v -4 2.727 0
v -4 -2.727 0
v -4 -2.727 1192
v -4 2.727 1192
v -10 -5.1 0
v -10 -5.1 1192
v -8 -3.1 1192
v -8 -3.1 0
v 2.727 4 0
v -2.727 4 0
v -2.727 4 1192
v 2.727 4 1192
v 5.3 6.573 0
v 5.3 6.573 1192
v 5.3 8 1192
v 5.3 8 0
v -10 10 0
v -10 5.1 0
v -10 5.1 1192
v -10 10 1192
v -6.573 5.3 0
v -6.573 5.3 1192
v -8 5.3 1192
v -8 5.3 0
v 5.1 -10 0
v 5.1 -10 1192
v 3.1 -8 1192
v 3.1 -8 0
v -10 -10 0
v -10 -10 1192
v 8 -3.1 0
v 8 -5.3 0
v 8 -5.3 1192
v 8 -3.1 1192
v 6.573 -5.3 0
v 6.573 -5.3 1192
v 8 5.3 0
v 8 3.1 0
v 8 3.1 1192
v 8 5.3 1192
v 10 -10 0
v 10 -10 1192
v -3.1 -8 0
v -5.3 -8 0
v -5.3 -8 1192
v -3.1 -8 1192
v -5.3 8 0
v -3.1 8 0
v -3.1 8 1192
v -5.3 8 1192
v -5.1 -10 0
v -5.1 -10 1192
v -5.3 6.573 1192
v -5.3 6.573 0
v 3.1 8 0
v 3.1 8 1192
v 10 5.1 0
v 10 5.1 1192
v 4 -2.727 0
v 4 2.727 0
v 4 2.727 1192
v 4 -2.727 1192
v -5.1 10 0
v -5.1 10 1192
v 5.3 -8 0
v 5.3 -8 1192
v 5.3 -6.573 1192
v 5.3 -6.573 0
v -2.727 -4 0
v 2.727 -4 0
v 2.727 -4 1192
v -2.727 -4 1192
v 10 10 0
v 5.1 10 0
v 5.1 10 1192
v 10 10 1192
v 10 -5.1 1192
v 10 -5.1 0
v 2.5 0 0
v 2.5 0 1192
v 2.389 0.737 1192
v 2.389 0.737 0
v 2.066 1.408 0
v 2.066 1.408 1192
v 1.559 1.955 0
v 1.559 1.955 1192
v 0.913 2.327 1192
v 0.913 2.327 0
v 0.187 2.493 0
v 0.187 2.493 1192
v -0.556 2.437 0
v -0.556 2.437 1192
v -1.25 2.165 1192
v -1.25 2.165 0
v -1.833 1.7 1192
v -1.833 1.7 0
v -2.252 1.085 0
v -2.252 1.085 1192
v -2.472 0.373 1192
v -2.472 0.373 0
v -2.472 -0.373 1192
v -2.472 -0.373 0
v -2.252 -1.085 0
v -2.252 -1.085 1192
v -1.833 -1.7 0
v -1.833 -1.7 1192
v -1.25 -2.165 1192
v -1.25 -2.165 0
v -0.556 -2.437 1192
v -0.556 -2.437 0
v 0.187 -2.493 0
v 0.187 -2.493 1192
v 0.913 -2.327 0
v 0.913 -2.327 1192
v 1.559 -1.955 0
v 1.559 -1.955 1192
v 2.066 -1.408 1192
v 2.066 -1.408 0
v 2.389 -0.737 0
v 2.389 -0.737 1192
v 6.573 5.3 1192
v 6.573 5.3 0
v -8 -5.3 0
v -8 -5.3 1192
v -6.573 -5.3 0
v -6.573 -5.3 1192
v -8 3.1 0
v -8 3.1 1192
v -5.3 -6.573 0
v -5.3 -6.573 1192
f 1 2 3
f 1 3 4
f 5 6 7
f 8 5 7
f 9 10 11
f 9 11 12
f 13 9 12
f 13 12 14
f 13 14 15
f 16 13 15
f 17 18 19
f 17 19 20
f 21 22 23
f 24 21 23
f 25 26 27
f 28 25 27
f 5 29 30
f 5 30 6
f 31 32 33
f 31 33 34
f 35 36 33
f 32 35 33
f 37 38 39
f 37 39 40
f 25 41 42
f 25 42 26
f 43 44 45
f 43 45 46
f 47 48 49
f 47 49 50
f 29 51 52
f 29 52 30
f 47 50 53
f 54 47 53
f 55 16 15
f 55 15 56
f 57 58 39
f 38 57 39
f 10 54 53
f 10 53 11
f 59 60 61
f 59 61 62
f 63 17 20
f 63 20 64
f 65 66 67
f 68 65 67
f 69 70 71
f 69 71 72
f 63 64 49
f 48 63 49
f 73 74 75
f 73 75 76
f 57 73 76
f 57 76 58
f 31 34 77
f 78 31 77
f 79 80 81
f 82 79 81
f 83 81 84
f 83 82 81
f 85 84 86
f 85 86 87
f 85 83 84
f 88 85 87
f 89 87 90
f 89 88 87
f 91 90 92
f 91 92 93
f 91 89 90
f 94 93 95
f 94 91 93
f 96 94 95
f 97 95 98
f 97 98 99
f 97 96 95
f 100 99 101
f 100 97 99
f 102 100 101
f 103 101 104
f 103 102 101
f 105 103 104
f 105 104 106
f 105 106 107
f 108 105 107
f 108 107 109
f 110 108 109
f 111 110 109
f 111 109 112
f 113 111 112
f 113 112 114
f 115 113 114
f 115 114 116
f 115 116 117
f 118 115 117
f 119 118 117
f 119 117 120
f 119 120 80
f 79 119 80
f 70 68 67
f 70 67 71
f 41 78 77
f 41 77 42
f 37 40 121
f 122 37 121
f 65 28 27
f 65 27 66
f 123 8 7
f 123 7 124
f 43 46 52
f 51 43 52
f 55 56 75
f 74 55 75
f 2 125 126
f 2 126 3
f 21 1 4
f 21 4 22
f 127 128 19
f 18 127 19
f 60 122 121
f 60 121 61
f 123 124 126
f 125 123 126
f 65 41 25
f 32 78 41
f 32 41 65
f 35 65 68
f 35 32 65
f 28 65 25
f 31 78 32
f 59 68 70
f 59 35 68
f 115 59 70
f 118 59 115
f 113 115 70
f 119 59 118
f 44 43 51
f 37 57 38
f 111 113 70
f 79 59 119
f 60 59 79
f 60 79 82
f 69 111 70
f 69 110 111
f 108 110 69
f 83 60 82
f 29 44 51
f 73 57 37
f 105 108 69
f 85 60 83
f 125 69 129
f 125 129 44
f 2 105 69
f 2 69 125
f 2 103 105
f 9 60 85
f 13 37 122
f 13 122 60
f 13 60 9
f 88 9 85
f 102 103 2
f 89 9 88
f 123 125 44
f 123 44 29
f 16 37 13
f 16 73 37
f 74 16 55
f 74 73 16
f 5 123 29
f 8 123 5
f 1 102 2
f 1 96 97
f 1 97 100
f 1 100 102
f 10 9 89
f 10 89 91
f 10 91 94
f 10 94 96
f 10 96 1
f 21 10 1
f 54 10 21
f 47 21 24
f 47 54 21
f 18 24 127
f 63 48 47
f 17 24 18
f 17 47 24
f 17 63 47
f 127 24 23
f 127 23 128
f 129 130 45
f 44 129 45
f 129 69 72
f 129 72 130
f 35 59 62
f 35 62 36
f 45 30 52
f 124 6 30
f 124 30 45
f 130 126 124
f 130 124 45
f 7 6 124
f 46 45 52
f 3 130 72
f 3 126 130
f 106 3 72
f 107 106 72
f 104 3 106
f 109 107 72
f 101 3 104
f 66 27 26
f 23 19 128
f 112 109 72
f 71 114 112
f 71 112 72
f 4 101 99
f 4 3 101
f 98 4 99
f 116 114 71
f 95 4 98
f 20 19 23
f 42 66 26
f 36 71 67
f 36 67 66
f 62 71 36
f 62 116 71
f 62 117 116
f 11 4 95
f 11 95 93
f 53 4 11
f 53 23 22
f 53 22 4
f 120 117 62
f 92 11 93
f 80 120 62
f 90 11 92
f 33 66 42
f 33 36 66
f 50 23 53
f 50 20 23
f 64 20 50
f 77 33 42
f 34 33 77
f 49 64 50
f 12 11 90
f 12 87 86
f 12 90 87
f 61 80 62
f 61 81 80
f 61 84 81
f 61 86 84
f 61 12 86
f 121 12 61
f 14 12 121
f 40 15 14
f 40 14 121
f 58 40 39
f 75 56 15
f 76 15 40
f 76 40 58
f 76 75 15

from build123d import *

# Parameters (mm, degrees)
SKETCH1_R              = 2.5
BOSS_EXTRUDE1_DEPTH    = 1200
CUT_REVOLVE1_START     = 1192
CUT_REVOLVE1_OUTLINE_R = 2.5
CUT_REVOLVE1_DEPTH     = 8


# Read off the part's stored shape, not the designer's step: Cut-Revolve1
with BuildPart() as part:
    # Sketch1 → Boss-Extrude1 (new body)
    with BuildSketch(Plane.XY):
        Polygon((-2.727207794, 4), (2.727207794, 4), (5.3, 6.572792206), (5.3, 8), (3.1, 8), (5.1, 10), (10, 10), (10, 5.1), (8, 3.1), (8, 5.3), (6.572792206, 5.3), (4, 2.727207794), (4, -2.727207794), (6.572792206, -5.3), (8, -5.3), (8, -3.1), (10, -5.1), (10, -10), (5.1, -10), (3.1, -8), (5.3, -8), (5.3, -6.572792206), (2.727207794, -4), (-2.727207794, -4), (-5.3, -6.572792206), (-5.3, -8), (-3.1, -8), (-5.1, -10), (-10, -10), (-10, -5.1), (-8, -3.1), (-8, -5.3), (-6.572792206, -5.3), (-4, -2.727207794), (-4, 2.727207794), (-6.572792206, 5.3), (-8, 5.3), (-8, 3.1), (-10, 5.1), (-10, 10), (-5.1, 10), (-3.1, 8), (-5.3, 8), (-5.3, 6.572792206), align=None)
        Circle(SKETCH1_R, mode=Mode.SUBTRACT)
    extrude(amount=BOSS_EXTRUDE1_DEPTH)

    # Cut-Revolve1 outline → Cut-Revolve1 (cut)
    with BuildSketch(Plane.XY.offset(CUT_REVOLVE1_START)):
        Polygon((4, 2.727207794), (6.572792206, 5.3), (8, 5.3), (8, 3.1), (10, 5.1), (10, 10), (5.1, 10), (3.1, 8), (5.3, 8), (5.3, 6.572792206), (2.727207794, 4), (-2.727207794, 4), (-5.3, 6.572792206), (-5.3, 8), (-3.1, 8), (-5.1, 10), (-10, 10), (-10, 5.1), (-8, 3.1), (-8, 5.3), (-6.572792206, 5.3), (-4, 2.727207794), (-4, -2.727207794), (-6.572792206, -5.3), (-8, -5.3), (-8, -3.1), (-10, -5.1), (-10, -10), (-5.1, -10), (-3.1, -8), (-5.3, -8), (-5.3, -6.572792206), (-2.727207794, -4), (2.727207794, -4), (5.3, -6.572792206), (5.3, -8), (3.1, -8), (5.1, -10), (10, -10), (10, -5.1), (8, -3.1), (8, -5.3), (6.572792206, -5.3), (4, -2.727207794), align=None)
        Circle(CUT_REVOLVE1_OUTLINE_R, mode=Mode.SUBTRACT)
    extrude(amount=CUT_REVOLVE1_DEPTH, mode=Mode.SUBTRACT)


solid = part.part
